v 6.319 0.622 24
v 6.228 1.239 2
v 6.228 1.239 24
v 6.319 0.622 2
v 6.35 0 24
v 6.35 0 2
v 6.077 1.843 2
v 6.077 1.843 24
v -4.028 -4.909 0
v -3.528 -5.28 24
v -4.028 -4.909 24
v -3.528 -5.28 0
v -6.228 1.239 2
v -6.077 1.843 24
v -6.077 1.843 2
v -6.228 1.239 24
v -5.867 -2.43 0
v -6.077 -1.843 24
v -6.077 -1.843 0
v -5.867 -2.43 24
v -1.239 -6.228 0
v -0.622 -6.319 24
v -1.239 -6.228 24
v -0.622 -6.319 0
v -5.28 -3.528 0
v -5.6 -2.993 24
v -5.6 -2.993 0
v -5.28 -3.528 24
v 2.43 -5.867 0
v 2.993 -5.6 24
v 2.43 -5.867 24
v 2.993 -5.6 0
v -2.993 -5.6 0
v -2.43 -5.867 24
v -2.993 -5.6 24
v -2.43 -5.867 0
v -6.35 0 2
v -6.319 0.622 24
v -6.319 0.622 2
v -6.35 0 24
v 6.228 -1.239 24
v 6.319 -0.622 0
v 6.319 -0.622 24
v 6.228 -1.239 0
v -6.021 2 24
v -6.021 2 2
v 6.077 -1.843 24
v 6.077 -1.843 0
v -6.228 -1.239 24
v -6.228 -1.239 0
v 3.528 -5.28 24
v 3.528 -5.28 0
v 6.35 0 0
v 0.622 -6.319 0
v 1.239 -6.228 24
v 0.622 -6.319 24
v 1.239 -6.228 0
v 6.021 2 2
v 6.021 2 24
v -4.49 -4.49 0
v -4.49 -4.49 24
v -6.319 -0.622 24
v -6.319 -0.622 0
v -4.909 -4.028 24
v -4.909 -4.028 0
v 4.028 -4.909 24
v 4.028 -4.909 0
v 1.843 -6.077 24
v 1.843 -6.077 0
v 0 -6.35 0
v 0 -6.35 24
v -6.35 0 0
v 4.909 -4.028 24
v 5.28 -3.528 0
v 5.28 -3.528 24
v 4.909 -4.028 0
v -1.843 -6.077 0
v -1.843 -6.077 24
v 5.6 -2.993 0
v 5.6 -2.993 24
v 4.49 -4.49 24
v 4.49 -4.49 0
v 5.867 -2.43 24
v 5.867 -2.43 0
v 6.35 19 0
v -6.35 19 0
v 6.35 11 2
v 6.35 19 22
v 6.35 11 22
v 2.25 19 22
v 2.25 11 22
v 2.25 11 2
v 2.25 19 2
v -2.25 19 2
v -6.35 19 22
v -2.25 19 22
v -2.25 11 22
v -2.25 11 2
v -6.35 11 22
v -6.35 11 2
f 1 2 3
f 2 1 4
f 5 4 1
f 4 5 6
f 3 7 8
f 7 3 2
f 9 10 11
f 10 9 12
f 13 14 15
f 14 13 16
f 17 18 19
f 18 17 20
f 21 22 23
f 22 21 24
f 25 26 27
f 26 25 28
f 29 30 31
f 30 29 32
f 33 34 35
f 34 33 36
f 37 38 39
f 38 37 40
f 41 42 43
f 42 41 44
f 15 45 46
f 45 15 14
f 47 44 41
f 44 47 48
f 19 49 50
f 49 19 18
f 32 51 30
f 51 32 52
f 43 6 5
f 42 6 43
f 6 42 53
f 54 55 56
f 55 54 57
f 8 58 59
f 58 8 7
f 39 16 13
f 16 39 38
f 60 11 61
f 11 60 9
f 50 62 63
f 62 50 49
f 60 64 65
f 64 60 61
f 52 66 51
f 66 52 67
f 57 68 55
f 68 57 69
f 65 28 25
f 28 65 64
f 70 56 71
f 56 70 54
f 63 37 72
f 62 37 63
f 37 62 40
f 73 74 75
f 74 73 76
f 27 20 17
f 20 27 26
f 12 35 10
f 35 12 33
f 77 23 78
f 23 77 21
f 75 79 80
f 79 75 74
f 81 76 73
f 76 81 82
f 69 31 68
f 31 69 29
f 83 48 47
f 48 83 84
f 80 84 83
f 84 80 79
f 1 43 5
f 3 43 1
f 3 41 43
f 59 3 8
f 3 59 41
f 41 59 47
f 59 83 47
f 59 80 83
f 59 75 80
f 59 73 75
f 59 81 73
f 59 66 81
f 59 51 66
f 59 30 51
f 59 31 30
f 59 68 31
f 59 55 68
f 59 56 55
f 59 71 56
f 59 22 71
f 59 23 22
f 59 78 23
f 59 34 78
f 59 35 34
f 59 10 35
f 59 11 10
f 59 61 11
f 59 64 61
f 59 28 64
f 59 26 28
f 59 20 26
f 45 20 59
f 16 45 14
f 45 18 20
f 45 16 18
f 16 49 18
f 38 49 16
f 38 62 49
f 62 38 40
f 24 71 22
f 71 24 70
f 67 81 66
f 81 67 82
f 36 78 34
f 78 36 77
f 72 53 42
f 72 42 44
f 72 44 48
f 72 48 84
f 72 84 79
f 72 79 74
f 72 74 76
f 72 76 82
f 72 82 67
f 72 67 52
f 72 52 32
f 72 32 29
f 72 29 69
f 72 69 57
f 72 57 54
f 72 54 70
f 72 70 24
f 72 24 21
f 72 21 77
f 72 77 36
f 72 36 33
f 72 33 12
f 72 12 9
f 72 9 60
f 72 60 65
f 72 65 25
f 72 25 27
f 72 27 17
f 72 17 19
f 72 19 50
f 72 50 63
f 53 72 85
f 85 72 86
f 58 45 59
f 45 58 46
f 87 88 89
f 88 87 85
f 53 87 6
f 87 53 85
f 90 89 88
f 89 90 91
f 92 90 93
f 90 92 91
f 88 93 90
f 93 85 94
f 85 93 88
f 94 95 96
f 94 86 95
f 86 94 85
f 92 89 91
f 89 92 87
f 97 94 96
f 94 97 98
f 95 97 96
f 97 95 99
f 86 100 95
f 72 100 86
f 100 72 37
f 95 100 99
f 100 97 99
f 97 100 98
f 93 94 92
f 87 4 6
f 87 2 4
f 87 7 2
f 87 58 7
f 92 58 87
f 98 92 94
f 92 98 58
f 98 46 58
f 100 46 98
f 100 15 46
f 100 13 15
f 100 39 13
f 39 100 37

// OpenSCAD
// Module: Basic cleaning wipe holder
// Repo: https://github.com/hornc/VHS-cleaning
// Author: hornc, 2026
// Version: v0.1
// License: CC BY-SA 4.0

cleaning_wipe_holder(base=true);

// Exported dimensions
function tape_width() = 12.7;


module cleaning_wipe_holder(base_h=2, base=false) {
    $fn = 64;
    post_h = 22;
    gap = 4.5;
    grip_depth = 8;
    tape_width = tape_width();

    // Main post
    difference(){
        cylinder(post_h + base_h, d=tape_width);
        translate([tape_width / -2, 2, -1])
            cube([tape_width + 5, tape_width, post_h + 5]);
    }
    // grip posts
    translate([2.25, 2 + 9, 0])
        cube([(tape_width - gap) / 2, grip_depth, post_h - 2 + base_h]);
    translate([1.85 - tape_width + gap, 2 + 9, 0])
        cube([(tape_width - gap) / 2, grip_depth, post_h - 2 + base_h]);

    if (base){
        translate([-tape_width / 2, 0, 0])
            cube([tape_width, tape_width + 6.3, base_h]);
    }
}
